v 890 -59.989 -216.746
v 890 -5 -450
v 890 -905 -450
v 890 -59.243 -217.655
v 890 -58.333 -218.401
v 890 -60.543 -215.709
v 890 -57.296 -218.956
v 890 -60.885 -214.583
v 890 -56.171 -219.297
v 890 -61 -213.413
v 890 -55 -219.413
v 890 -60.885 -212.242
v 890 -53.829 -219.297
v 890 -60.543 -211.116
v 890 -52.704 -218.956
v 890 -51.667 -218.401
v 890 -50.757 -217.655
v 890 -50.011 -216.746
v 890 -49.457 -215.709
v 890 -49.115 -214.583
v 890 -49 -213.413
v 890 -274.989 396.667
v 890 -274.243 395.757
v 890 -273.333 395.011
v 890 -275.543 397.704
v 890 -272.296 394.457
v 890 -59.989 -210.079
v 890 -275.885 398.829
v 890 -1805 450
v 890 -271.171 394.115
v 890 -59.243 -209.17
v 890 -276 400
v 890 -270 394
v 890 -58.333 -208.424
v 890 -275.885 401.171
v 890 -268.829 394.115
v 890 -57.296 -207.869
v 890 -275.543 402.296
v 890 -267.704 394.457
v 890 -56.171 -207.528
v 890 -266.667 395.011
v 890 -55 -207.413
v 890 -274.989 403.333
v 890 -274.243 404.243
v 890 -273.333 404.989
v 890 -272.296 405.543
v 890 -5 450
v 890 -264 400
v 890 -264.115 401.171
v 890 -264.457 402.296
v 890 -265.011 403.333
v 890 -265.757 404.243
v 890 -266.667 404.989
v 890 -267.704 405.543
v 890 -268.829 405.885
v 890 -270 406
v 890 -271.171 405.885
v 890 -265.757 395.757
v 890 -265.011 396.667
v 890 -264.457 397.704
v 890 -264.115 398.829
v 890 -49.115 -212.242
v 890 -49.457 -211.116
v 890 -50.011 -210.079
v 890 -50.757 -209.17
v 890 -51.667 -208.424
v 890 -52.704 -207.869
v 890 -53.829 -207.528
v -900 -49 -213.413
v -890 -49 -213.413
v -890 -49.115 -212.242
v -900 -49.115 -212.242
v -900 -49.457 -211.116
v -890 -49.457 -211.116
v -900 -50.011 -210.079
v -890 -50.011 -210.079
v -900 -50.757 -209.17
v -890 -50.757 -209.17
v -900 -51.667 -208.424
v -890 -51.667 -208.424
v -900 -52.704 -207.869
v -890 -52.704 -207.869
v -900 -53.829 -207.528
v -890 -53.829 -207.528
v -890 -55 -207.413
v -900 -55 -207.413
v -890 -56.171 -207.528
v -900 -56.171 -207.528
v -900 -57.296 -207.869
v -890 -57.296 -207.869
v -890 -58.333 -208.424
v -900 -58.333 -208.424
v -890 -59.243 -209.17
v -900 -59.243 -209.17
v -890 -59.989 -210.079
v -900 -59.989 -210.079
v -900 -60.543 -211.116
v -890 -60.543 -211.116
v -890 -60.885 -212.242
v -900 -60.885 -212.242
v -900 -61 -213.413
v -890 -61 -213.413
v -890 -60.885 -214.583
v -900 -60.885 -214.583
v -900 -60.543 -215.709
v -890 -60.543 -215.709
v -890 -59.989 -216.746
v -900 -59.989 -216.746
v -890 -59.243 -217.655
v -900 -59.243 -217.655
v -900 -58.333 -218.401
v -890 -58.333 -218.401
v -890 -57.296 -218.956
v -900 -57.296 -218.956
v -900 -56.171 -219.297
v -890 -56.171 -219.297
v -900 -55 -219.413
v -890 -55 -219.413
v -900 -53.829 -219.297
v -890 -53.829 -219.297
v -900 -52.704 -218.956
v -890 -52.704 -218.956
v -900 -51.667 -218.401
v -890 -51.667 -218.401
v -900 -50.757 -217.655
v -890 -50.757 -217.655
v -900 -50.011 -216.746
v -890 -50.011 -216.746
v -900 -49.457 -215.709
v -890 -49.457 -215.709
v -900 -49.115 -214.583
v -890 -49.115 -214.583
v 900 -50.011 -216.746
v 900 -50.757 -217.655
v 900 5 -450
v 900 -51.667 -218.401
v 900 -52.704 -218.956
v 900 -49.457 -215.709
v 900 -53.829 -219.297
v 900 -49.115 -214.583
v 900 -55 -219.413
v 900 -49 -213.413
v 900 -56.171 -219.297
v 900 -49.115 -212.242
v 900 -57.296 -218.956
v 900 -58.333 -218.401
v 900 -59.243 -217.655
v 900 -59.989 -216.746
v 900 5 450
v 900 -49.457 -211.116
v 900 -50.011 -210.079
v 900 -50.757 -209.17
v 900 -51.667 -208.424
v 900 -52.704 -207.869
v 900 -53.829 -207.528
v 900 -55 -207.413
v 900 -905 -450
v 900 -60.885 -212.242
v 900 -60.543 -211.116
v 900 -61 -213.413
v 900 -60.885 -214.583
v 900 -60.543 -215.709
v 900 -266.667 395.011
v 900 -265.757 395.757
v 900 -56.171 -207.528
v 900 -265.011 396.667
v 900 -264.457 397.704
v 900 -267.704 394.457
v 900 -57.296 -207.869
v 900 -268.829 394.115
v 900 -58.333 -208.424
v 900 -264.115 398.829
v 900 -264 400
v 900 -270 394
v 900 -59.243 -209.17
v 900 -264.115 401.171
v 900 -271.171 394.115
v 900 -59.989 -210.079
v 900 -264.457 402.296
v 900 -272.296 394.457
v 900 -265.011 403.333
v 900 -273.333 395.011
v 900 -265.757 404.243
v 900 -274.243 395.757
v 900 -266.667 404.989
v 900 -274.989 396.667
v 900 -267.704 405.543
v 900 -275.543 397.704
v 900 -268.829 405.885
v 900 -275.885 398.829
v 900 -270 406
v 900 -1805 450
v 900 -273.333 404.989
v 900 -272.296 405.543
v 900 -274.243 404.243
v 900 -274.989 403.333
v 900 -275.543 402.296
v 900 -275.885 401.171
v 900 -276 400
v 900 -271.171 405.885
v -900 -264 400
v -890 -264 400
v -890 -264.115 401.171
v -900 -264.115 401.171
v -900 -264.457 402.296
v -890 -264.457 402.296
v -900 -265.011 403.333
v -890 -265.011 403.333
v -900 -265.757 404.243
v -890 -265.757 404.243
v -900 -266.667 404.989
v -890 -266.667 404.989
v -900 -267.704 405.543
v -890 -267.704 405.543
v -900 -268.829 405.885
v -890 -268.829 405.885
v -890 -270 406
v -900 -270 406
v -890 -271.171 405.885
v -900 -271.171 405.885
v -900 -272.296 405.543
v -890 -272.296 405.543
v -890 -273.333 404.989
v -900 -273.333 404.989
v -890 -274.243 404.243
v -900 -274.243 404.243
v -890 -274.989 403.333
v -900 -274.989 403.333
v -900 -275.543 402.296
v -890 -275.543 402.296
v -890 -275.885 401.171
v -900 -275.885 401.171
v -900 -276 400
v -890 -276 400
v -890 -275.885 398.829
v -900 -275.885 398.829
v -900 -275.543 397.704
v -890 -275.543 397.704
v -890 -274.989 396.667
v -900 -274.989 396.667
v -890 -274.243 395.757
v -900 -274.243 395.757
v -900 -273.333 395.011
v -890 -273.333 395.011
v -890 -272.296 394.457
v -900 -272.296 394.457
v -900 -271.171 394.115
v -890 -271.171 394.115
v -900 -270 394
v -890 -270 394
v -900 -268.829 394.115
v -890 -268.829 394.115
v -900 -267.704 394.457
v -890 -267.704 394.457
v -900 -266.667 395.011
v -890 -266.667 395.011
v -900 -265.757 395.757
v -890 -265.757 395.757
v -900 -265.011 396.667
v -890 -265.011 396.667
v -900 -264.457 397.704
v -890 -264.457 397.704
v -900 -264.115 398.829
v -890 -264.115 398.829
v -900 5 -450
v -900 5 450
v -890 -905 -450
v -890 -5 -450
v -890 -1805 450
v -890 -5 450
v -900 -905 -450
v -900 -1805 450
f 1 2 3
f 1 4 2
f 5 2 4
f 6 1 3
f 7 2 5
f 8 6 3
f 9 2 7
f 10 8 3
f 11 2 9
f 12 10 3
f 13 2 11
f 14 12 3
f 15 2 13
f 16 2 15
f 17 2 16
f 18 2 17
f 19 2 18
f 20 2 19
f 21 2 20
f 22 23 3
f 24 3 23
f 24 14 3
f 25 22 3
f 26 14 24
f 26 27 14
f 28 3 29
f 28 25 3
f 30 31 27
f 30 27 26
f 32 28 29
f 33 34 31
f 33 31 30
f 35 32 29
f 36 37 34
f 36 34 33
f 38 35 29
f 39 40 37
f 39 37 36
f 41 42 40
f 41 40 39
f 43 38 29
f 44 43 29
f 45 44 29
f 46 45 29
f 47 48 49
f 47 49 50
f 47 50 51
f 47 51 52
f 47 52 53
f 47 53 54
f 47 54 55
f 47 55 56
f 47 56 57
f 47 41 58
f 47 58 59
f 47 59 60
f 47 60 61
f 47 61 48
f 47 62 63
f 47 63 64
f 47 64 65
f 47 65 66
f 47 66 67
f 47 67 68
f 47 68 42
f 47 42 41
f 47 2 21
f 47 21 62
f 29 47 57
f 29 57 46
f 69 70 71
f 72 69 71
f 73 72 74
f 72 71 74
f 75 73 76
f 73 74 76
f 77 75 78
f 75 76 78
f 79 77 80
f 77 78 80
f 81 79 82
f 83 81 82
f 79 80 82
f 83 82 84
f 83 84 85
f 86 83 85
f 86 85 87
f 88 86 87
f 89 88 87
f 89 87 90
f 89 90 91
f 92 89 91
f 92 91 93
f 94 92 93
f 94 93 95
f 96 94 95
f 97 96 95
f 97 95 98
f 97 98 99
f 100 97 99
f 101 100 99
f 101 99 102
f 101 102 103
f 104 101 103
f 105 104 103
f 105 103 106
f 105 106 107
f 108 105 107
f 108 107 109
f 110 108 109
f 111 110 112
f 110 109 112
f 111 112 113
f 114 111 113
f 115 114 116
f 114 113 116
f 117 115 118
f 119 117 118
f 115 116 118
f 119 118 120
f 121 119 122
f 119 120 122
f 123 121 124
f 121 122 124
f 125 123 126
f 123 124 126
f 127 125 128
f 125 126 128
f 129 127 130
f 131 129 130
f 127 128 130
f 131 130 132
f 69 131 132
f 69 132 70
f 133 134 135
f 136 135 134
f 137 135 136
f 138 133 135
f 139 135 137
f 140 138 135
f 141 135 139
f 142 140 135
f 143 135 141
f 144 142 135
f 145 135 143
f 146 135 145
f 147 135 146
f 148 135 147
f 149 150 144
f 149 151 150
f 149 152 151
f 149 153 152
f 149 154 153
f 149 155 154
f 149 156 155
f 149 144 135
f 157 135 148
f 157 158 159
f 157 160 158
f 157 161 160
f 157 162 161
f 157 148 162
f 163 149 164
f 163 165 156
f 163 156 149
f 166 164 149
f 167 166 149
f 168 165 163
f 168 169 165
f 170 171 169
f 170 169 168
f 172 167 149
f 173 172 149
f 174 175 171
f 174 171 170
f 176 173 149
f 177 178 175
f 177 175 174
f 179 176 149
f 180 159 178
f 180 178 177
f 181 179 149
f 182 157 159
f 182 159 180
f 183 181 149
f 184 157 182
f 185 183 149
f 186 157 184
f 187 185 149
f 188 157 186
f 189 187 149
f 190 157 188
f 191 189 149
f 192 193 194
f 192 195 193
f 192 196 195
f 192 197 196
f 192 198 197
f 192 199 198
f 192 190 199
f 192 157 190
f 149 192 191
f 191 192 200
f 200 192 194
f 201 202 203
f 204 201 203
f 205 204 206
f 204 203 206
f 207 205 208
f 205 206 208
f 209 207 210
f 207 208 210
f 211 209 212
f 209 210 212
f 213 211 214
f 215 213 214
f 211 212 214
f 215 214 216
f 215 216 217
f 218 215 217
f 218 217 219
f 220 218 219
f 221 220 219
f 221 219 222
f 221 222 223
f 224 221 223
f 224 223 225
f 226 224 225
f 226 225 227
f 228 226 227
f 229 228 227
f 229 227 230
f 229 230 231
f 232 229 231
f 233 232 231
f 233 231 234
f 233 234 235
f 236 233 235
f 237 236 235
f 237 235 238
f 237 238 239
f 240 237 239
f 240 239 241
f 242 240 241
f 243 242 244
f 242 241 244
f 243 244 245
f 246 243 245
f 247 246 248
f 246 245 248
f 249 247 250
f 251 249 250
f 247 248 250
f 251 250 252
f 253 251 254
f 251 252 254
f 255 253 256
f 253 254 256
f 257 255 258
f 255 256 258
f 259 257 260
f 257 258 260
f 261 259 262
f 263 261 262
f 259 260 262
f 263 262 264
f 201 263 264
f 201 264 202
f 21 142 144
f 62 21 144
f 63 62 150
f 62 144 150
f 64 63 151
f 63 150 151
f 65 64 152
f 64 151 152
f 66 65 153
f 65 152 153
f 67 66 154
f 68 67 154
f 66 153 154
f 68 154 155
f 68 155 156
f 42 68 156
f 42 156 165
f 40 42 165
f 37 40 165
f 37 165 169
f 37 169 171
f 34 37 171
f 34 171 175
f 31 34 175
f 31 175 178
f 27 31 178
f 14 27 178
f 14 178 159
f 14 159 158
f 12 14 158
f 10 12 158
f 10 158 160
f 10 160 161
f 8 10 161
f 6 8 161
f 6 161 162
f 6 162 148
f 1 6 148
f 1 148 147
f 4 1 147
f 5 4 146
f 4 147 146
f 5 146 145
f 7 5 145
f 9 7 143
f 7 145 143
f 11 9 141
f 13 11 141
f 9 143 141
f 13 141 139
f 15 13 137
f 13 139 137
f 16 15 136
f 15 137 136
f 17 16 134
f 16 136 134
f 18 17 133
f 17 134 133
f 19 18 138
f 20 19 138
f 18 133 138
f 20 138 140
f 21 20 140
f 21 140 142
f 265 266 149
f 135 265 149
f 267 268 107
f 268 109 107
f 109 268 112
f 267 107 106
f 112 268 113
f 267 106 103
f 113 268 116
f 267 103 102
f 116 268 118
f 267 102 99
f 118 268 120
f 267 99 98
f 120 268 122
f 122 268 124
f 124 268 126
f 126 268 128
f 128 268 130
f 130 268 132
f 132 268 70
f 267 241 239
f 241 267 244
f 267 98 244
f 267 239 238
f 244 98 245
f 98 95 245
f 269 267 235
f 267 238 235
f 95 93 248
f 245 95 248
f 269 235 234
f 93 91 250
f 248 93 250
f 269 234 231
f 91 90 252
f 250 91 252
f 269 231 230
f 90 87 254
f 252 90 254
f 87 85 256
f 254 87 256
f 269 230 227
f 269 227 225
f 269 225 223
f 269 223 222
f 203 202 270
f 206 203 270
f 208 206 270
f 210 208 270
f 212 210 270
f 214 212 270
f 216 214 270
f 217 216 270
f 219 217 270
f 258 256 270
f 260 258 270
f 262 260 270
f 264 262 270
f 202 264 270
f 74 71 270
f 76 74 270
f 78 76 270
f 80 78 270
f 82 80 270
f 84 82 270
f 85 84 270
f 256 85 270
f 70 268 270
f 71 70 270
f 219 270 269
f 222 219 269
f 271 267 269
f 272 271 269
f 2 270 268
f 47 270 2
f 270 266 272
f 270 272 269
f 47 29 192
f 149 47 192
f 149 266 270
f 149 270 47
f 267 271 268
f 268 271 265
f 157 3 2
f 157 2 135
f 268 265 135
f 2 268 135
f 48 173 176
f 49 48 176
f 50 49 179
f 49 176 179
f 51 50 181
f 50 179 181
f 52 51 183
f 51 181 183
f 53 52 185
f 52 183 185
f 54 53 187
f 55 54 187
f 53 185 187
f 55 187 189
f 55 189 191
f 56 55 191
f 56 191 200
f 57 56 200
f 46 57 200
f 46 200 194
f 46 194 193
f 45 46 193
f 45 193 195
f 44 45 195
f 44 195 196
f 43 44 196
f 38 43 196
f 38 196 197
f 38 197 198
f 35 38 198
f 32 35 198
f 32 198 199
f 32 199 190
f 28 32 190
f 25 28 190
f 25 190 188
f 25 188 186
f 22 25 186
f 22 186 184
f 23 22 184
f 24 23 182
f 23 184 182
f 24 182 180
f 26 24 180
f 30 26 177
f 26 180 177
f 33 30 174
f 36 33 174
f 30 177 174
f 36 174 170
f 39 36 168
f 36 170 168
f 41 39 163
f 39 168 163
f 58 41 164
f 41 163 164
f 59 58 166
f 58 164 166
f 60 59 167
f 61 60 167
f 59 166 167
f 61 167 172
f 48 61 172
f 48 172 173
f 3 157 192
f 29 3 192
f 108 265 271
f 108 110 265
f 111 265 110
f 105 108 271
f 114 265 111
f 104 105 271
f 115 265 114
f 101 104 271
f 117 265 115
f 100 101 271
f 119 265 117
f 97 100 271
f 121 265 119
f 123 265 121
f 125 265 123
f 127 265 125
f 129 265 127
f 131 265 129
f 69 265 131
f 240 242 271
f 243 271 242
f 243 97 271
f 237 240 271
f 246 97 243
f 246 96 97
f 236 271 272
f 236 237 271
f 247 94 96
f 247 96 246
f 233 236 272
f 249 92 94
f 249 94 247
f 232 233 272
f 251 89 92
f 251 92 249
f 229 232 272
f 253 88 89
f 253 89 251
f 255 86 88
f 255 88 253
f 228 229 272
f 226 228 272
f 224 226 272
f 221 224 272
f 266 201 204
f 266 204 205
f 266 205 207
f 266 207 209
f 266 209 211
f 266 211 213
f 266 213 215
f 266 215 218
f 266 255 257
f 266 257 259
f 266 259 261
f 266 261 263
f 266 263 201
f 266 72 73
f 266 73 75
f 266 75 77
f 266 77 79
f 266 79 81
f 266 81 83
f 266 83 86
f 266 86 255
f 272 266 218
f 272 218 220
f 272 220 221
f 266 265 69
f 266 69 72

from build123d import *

# Parameters (mm, degrees)
F0_W     = 1800
F0_H     = 900
F1_DEPTH = 5
F2_W     = 10
F2_H     = 900
F3_DEPTH = 1800
F5_DEPTH = 1800.001
F7_D     = 12


with BuildPart() as f1:
    # F0 (on Front) → F1 (new body, symmetric)
    with BuildSketch(Plane.XZ):
        Rectangle(F0_W, F0_H)
    extrude(amount=F1_DEPTH, both=True)

    # F2 (on face) → F3 (join)
    with BuildSketch(Plane.XZ.offset(5)):
        with Locations((-895, 0)):
            Rectangle(F2_W, F2_H)
        with Locations((895, 0)):
            Rectangle(F2_W, F2_H)
    extrude(amount=F3_DEPTH)

    # F4 (on face) → F5 (cut, through all)
    with BuildSketch(Plane.YZ.offset(900)):
        Polygon((-905, -450), (-1805, 450), (-1805, -450), align=None)
    extrude(amount=-F5_DEPTH, mode=Mode.SUBTRACT)

    # F7 (through all)
    with Locations(Plane(origin=(-900, 0, 0), x_dir=(0, -1, 0), z_dir=(-1, 0, 0))):
        with Locations((270, 400), (55, -213.412585)):
            Hole(F7_D / 2)


solid = f1.part
